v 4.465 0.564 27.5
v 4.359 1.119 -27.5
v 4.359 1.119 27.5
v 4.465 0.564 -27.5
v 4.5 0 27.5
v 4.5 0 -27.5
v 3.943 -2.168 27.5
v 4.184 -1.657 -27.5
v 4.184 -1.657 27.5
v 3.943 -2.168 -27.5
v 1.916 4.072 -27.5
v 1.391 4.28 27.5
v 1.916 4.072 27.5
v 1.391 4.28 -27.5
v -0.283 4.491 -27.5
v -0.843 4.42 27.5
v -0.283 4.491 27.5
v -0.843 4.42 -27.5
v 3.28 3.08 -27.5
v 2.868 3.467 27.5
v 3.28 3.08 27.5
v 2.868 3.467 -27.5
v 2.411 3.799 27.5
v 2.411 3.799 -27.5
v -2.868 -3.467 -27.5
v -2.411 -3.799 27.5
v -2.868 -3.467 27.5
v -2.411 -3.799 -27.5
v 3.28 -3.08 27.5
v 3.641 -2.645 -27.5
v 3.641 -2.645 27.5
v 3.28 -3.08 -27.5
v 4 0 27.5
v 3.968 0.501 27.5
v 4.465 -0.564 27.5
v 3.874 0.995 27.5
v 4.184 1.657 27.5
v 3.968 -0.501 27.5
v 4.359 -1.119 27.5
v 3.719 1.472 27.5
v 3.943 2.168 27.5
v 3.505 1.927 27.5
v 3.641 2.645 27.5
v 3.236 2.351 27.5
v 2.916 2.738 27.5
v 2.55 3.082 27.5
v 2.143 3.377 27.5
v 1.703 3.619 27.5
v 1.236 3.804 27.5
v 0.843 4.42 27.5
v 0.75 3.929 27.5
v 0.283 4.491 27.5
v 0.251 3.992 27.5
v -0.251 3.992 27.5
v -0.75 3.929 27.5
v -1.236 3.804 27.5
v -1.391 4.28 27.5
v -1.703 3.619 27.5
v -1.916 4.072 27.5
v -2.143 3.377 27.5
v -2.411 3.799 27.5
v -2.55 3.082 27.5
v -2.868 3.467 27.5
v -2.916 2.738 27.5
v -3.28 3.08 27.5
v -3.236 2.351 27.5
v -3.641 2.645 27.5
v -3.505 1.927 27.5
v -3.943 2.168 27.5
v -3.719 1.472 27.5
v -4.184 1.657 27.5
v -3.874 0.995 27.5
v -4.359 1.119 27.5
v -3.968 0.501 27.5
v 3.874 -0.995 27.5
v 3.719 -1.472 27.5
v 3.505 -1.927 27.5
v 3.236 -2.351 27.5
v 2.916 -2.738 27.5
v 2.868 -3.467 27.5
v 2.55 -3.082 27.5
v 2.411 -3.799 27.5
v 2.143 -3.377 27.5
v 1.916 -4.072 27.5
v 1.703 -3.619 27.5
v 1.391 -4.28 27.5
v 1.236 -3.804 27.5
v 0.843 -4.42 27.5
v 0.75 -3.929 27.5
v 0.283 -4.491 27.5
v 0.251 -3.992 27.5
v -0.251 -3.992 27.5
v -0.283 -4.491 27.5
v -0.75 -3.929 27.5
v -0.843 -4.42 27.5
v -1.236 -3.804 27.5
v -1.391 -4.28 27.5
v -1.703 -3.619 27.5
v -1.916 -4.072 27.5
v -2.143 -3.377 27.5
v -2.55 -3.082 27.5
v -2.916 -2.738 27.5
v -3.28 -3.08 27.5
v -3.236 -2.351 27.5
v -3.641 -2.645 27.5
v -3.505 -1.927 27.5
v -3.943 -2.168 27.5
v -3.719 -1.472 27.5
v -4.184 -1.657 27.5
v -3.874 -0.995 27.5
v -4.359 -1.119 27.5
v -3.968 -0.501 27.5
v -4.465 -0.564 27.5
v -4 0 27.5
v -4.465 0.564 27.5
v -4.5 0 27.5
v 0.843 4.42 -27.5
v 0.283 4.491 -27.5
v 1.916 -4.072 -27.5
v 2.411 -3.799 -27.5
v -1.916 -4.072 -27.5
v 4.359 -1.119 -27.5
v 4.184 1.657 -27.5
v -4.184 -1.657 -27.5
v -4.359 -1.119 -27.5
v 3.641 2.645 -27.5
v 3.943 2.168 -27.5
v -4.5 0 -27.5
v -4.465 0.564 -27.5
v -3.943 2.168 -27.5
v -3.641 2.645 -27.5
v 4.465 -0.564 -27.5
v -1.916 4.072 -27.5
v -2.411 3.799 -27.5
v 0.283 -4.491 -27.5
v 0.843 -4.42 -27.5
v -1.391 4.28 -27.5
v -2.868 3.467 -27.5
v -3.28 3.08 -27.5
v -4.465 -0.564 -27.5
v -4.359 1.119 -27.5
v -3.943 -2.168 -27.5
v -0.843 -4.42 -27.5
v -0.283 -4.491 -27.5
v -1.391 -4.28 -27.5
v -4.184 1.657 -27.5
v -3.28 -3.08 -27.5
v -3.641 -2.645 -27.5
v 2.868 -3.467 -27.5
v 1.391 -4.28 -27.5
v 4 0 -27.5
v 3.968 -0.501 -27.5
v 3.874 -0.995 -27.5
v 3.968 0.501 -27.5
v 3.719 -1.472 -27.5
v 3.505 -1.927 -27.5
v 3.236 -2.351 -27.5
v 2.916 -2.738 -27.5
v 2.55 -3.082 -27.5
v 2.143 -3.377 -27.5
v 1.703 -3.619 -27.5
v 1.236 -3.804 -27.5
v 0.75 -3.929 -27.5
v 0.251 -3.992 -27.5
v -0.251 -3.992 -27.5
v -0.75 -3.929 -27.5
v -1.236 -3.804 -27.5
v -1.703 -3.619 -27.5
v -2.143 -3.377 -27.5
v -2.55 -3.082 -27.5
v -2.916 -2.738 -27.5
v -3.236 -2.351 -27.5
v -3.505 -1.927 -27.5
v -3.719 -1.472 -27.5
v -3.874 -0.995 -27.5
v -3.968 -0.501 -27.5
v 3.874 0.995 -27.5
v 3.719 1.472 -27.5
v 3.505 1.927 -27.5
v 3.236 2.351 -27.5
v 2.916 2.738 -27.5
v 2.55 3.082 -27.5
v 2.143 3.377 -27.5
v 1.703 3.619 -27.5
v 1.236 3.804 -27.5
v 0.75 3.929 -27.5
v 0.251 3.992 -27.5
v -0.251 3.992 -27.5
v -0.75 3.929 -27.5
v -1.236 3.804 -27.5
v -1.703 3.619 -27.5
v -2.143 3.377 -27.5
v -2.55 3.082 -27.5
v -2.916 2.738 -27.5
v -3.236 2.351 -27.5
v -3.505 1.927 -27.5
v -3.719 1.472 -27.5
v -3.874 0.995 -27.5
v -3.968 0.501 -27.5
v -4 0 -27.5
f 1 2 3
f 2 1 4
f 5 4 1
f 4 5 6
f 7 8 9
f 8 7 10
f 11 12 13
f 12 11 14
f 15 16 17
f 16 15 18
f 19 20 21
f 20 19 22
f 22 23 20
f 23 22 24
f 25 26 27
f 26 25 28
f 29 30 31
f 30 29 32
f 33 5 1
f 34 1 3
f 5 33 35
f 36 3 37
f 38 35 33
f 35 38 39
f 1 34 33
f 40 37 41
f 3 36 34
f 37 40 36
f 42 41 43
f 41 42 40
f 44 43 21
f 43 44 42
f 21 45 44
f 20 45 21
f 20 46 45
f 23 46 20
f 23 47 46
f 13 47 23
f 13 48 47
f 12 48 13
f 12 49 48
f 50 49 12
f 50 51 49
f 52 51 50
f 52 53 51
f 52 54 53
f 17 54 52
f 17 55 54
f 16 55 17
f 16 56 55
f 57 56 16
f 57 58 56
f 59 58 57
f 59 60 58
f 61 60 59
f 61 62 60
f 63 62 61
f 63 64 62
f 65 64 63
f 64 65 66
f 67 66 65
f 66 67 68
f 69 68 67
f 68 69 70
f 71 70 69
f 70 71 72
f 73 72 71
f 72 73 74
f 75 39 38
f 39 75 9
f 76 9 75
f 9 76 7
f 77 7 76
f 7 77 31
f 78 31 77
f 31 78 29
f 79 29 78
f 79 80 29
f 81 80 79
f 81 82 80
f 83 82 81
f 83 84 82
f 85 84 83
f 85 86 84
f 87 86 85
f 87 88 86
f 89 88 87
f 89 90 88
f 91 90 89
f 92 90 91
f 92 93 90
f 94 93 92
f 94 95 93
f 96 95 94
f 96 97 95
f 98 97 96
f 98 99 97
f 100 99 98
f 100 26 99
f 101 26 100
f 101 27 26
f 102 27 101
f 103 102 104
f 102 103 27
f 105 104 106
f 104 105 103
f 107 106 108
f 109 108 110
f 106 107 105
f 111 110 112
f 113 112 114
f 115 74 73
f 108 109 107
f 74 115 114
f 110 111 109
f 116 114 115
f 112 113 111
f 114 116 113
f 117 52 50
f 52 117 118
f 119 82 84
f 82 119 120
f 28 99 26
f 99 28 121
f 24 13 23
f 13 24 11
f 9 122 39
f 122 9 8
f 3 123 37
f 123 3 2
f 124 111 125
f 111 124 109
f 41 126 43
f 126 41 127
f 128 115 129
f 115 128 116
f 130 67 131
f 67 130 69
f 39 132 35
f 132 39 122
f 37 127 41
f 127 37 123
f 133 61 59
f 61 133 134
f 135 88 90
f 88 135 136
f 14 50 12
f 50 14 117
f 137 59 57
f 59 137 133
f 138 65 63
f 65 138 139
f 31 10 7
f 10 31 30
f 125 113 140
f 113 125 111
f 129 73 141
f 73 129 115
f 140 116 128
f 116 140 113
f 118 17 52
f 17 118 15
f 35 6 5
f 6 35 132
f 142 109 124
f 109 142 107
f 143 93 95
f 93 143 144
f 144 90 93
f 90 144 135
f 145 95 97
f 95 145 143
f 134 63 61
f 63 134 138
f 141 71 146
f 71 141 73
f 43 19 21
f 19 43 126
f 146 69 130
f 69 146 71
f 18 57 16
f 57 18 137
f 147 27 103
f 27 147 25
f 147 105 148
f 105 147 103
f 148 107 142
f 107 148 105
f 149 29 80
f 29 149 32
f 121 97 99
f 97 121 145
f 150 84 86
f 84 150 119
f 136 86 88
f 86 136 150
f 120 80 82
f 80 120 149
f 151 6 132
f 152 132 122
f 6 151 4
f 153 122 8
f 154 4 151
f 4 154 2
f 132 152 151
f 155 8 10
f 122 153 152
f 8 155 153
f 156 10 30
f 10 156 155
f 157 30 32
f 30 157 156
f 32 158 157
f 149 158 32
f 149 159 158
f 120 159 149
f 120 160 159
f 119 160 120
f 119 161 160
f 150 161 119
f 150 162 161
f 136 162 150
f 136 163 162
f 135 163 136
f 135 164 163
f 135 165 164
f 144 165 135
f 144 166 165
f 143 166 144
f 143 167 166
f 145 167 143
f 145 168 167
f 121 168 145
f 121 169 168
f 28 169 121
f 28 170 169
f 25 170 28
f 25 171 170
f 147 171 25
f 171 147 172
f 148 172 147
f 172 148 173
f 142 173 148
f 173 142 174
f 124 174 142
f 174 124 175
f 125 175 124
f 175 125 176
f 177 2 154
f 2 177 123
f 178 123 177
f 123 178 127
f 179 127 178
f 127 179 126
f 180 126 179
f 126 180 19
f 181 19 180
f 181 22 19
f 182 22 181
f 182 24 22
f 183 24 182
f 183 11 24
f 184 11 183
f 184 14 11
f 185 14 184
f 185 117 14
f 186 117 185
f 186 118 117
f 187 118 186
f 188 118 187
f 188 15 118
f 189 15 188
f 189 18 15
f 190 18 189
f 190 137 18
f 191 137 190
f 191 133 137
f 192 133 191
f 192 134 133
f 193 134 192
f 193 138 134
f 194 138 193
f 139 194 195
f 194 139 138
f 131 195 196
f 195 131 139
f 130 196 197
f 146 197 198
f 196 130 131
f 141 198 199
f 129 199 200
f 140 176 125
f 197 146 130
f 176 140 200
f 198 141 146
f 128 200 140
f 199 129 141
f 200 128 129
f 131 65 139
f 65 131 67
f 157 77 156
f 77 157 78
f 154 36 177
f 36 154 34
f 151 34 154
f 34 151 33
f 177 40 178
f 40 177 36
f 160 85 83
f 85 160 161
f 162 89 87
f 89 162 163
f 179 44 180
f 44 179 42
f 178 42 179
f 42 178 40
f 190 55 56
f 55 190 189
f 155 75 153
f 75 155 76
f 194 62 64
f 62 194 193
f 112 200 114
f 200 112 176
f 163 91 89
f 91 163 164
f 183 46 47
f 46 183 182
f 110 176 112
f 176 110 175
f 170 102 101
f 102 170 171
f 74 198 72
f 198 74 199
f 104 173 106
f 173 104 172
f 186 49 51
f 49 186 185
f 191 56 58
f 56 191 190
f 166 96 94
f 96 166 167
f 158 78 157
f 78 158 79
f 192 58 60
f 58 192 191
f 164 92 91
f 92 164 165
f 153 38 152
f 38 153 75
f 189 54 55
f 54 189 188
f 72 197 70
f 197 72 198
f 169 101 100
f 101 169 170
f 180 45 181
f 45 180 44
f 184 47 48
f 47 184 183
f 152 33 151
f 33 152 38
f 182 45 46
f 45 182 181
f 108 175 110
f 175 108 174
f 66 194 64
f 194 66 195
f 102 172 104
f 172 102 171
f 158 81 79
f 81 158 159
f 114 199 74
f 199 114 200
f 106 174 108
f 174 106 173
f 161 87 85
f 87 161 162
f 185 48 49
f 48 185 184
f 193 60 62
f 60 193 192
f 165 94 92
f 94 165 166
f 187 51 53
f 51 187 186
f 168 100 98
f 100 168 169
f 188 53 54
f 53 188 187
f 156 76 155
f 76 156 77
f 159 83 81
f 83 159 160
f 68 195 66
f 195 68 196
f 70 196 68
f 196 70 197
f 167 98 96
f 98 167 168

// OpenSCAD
$fn = 50;


difference() {
	union() {
		translate(v = [0, 0, -27.5000000000]) {
			cylinder(h = 55, r = 4.5000000000);
		}
	}
	union() {
		translate(v = [0, 0, -100.0000000000]) {
			cylinder(h = 200, r = 4.0000000000);
		}
	}
}
